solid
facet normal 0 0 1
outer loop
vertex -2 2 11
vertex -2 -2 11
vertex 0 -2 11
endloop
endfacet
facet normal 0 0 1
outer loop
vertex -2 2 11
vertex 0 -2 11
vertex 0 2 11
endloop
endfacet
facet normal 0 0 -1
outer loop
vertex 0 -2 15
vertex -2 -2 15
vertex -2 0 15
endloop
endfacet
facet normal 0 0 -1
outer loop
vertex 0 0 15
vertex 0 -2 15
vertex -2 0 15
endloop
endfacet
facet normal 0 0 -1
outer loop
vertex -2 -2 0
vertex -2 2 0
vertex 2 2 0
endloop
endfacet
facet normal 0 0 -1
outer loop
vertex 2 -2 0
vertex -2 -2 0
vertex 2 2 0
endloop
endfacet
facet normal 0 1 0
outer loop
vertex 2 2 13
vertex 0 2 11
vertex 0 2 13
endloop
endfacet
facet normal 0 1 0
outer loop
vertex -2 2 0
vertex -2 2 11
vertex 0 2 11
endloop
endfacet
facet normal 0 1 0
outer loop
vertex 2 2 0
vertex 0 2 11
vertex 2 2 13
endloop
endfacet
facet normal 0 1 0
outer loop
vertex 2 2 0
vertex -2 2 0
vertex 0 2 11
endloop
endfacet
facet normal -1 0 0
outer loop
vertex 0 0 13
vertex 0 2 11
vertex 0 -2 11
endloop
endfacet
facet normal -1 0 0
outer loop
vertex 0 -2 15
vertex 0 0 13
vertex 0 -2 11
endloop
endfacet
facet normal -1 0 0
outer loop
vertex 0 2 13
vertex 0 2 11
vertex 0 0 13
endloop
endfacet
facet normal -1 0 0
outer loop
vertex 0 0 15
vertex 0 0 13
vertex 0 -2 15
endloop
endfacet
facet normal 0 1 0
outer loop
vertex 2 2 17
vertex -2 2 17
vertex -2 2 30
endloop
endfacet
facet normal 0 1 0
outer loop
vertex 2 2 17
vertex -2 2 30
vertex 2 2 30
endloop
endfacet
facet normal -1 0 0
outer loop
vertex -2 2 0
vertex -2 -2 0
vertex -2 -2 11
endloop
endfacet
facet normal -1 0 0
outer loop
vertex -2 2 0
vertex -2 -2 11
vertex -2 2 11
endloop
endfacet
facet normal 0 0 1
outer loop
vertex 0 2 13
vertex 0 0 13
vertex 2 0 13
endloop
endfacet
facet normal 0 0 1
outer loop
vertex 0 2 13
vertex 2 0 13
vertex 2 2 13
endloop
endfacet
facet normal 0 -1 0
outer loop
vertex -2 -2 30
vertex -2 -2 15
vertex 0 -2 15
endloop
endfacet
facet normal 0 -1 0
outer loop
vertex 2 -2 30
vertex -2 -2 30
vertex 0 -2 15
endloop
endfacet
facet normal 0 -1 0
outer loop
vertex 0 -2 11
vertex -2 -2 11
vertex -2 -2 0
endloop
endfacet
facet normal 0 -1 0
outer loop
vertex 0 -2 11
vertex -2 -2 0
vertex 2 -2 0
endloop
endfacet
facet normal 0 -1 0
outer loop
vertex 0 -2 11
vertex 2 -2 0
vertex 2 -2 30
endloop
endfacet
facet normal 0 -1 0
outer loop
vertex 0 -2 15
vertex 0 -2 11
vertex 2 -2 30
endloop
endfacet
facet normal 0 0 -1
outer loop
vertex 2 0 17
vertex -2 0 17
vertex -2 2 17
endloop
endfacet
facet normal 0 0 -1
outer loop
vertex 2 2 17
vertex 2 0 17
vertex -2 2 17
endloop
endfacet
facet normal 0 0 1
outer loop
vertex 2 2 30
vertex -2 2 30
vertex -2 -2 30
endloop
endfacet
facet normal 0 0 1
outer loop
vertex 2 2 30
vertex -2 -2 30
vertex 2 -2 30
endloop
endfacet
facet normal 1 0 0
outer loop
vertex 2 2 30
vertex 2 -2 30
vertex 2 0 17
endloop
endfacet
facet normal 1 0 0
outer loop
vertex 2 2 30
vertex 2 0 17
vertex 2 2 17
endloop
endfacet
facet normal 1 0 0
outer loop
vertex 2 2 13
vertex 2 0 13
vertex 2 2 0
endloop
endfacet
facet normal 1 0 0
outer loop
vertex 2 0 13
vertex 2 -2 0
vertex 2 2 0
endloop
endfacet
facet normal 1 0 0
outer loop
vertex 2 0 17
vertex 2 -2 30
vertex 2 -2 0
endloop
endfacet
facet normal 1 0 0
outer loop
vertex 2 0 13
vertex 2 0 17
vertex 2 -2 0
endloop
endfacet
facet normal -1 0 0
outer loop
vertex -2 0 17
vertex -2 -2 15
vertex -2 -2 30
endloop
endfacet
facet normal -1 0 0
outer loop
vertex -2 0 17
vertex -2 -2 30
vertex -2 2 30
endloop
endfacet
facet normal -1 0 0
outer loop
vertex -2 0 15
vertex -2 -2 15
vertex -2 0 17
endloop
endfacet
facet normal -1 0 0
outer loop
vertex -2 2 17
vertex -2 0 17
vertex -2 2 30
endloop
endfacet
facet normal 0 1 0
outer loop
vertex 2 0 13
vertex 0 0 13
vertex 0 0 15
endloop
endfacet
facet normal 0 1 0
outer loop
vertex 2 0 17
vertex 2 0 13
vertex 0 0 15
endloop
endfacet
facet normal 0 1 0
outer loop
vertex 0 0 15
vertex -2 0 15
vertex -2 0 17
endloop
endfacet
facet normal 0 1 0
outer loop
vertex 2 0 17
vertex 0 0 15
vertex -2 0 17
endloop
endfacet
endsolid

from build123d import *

# Parameters (mm, degrees)
SKETCH_1_W          = 4
SKETCH_1_H          = 4
EXTRUDE_1_DEPTH     = 30
SKETCH_3_W          = 2
SKETCH_3_H          = 4
CUT_EXTRUDE_1_DEPTH = 2
SKETCH_4_W          = 4
SKETCH_4_H          = 2
CUT_EXTRUDE_2_DEPTH = 4
SKETCH_5_W          = 2
SKETCH_5_H          = 2
CUT_EXTRUDE_3_DEPTH = 2


with BuildPart() as part:
    # 草圖1 → 填料-伸長1 (new body)
    with BuildSketch(Plane.XY):
        Rectangle(SKETCH_1_W, SKETCH_1_H)
    extrude(amount=EXTRUDE_1_DEPTH)

    # 草圖3 → 除料-伸長1 (cut)
    with BuildSketch(Plane.ZY.offset(2)):
        with Locations((12, 0)):
            Rectangle(SKETCH_3_W, SKETCH_3_H)
    extrude(amount=-CUT_EXTRUDE_1_DEPTH, mode=Mode.SUBTRACT)

    # 草圖4 → 除料-伸長2 (cut)
    with BuildSketch(Plane.ZY.offset(2)):
        with Locations((15, 1)):
            Rectangle(SKETCH_4_W, SKETCH_4_H)
    extrude(amount=-CUT_EXTRUDE_2_DEPTH, mode=Mode.SUBTRACT)

    # 草圖5 → 除料-伸長3 (cut)
    with BuildSketch(Plane.ZY.offset(2)):
        with Locations((14, -1)):
            Rectangle(SKETCH_5_W, SKETCH_5_H)
    extrude(amount=-CUT_EXTRUDE_3_DEPTH, mode=Mode.SUBTRACT)


solid = part.part
